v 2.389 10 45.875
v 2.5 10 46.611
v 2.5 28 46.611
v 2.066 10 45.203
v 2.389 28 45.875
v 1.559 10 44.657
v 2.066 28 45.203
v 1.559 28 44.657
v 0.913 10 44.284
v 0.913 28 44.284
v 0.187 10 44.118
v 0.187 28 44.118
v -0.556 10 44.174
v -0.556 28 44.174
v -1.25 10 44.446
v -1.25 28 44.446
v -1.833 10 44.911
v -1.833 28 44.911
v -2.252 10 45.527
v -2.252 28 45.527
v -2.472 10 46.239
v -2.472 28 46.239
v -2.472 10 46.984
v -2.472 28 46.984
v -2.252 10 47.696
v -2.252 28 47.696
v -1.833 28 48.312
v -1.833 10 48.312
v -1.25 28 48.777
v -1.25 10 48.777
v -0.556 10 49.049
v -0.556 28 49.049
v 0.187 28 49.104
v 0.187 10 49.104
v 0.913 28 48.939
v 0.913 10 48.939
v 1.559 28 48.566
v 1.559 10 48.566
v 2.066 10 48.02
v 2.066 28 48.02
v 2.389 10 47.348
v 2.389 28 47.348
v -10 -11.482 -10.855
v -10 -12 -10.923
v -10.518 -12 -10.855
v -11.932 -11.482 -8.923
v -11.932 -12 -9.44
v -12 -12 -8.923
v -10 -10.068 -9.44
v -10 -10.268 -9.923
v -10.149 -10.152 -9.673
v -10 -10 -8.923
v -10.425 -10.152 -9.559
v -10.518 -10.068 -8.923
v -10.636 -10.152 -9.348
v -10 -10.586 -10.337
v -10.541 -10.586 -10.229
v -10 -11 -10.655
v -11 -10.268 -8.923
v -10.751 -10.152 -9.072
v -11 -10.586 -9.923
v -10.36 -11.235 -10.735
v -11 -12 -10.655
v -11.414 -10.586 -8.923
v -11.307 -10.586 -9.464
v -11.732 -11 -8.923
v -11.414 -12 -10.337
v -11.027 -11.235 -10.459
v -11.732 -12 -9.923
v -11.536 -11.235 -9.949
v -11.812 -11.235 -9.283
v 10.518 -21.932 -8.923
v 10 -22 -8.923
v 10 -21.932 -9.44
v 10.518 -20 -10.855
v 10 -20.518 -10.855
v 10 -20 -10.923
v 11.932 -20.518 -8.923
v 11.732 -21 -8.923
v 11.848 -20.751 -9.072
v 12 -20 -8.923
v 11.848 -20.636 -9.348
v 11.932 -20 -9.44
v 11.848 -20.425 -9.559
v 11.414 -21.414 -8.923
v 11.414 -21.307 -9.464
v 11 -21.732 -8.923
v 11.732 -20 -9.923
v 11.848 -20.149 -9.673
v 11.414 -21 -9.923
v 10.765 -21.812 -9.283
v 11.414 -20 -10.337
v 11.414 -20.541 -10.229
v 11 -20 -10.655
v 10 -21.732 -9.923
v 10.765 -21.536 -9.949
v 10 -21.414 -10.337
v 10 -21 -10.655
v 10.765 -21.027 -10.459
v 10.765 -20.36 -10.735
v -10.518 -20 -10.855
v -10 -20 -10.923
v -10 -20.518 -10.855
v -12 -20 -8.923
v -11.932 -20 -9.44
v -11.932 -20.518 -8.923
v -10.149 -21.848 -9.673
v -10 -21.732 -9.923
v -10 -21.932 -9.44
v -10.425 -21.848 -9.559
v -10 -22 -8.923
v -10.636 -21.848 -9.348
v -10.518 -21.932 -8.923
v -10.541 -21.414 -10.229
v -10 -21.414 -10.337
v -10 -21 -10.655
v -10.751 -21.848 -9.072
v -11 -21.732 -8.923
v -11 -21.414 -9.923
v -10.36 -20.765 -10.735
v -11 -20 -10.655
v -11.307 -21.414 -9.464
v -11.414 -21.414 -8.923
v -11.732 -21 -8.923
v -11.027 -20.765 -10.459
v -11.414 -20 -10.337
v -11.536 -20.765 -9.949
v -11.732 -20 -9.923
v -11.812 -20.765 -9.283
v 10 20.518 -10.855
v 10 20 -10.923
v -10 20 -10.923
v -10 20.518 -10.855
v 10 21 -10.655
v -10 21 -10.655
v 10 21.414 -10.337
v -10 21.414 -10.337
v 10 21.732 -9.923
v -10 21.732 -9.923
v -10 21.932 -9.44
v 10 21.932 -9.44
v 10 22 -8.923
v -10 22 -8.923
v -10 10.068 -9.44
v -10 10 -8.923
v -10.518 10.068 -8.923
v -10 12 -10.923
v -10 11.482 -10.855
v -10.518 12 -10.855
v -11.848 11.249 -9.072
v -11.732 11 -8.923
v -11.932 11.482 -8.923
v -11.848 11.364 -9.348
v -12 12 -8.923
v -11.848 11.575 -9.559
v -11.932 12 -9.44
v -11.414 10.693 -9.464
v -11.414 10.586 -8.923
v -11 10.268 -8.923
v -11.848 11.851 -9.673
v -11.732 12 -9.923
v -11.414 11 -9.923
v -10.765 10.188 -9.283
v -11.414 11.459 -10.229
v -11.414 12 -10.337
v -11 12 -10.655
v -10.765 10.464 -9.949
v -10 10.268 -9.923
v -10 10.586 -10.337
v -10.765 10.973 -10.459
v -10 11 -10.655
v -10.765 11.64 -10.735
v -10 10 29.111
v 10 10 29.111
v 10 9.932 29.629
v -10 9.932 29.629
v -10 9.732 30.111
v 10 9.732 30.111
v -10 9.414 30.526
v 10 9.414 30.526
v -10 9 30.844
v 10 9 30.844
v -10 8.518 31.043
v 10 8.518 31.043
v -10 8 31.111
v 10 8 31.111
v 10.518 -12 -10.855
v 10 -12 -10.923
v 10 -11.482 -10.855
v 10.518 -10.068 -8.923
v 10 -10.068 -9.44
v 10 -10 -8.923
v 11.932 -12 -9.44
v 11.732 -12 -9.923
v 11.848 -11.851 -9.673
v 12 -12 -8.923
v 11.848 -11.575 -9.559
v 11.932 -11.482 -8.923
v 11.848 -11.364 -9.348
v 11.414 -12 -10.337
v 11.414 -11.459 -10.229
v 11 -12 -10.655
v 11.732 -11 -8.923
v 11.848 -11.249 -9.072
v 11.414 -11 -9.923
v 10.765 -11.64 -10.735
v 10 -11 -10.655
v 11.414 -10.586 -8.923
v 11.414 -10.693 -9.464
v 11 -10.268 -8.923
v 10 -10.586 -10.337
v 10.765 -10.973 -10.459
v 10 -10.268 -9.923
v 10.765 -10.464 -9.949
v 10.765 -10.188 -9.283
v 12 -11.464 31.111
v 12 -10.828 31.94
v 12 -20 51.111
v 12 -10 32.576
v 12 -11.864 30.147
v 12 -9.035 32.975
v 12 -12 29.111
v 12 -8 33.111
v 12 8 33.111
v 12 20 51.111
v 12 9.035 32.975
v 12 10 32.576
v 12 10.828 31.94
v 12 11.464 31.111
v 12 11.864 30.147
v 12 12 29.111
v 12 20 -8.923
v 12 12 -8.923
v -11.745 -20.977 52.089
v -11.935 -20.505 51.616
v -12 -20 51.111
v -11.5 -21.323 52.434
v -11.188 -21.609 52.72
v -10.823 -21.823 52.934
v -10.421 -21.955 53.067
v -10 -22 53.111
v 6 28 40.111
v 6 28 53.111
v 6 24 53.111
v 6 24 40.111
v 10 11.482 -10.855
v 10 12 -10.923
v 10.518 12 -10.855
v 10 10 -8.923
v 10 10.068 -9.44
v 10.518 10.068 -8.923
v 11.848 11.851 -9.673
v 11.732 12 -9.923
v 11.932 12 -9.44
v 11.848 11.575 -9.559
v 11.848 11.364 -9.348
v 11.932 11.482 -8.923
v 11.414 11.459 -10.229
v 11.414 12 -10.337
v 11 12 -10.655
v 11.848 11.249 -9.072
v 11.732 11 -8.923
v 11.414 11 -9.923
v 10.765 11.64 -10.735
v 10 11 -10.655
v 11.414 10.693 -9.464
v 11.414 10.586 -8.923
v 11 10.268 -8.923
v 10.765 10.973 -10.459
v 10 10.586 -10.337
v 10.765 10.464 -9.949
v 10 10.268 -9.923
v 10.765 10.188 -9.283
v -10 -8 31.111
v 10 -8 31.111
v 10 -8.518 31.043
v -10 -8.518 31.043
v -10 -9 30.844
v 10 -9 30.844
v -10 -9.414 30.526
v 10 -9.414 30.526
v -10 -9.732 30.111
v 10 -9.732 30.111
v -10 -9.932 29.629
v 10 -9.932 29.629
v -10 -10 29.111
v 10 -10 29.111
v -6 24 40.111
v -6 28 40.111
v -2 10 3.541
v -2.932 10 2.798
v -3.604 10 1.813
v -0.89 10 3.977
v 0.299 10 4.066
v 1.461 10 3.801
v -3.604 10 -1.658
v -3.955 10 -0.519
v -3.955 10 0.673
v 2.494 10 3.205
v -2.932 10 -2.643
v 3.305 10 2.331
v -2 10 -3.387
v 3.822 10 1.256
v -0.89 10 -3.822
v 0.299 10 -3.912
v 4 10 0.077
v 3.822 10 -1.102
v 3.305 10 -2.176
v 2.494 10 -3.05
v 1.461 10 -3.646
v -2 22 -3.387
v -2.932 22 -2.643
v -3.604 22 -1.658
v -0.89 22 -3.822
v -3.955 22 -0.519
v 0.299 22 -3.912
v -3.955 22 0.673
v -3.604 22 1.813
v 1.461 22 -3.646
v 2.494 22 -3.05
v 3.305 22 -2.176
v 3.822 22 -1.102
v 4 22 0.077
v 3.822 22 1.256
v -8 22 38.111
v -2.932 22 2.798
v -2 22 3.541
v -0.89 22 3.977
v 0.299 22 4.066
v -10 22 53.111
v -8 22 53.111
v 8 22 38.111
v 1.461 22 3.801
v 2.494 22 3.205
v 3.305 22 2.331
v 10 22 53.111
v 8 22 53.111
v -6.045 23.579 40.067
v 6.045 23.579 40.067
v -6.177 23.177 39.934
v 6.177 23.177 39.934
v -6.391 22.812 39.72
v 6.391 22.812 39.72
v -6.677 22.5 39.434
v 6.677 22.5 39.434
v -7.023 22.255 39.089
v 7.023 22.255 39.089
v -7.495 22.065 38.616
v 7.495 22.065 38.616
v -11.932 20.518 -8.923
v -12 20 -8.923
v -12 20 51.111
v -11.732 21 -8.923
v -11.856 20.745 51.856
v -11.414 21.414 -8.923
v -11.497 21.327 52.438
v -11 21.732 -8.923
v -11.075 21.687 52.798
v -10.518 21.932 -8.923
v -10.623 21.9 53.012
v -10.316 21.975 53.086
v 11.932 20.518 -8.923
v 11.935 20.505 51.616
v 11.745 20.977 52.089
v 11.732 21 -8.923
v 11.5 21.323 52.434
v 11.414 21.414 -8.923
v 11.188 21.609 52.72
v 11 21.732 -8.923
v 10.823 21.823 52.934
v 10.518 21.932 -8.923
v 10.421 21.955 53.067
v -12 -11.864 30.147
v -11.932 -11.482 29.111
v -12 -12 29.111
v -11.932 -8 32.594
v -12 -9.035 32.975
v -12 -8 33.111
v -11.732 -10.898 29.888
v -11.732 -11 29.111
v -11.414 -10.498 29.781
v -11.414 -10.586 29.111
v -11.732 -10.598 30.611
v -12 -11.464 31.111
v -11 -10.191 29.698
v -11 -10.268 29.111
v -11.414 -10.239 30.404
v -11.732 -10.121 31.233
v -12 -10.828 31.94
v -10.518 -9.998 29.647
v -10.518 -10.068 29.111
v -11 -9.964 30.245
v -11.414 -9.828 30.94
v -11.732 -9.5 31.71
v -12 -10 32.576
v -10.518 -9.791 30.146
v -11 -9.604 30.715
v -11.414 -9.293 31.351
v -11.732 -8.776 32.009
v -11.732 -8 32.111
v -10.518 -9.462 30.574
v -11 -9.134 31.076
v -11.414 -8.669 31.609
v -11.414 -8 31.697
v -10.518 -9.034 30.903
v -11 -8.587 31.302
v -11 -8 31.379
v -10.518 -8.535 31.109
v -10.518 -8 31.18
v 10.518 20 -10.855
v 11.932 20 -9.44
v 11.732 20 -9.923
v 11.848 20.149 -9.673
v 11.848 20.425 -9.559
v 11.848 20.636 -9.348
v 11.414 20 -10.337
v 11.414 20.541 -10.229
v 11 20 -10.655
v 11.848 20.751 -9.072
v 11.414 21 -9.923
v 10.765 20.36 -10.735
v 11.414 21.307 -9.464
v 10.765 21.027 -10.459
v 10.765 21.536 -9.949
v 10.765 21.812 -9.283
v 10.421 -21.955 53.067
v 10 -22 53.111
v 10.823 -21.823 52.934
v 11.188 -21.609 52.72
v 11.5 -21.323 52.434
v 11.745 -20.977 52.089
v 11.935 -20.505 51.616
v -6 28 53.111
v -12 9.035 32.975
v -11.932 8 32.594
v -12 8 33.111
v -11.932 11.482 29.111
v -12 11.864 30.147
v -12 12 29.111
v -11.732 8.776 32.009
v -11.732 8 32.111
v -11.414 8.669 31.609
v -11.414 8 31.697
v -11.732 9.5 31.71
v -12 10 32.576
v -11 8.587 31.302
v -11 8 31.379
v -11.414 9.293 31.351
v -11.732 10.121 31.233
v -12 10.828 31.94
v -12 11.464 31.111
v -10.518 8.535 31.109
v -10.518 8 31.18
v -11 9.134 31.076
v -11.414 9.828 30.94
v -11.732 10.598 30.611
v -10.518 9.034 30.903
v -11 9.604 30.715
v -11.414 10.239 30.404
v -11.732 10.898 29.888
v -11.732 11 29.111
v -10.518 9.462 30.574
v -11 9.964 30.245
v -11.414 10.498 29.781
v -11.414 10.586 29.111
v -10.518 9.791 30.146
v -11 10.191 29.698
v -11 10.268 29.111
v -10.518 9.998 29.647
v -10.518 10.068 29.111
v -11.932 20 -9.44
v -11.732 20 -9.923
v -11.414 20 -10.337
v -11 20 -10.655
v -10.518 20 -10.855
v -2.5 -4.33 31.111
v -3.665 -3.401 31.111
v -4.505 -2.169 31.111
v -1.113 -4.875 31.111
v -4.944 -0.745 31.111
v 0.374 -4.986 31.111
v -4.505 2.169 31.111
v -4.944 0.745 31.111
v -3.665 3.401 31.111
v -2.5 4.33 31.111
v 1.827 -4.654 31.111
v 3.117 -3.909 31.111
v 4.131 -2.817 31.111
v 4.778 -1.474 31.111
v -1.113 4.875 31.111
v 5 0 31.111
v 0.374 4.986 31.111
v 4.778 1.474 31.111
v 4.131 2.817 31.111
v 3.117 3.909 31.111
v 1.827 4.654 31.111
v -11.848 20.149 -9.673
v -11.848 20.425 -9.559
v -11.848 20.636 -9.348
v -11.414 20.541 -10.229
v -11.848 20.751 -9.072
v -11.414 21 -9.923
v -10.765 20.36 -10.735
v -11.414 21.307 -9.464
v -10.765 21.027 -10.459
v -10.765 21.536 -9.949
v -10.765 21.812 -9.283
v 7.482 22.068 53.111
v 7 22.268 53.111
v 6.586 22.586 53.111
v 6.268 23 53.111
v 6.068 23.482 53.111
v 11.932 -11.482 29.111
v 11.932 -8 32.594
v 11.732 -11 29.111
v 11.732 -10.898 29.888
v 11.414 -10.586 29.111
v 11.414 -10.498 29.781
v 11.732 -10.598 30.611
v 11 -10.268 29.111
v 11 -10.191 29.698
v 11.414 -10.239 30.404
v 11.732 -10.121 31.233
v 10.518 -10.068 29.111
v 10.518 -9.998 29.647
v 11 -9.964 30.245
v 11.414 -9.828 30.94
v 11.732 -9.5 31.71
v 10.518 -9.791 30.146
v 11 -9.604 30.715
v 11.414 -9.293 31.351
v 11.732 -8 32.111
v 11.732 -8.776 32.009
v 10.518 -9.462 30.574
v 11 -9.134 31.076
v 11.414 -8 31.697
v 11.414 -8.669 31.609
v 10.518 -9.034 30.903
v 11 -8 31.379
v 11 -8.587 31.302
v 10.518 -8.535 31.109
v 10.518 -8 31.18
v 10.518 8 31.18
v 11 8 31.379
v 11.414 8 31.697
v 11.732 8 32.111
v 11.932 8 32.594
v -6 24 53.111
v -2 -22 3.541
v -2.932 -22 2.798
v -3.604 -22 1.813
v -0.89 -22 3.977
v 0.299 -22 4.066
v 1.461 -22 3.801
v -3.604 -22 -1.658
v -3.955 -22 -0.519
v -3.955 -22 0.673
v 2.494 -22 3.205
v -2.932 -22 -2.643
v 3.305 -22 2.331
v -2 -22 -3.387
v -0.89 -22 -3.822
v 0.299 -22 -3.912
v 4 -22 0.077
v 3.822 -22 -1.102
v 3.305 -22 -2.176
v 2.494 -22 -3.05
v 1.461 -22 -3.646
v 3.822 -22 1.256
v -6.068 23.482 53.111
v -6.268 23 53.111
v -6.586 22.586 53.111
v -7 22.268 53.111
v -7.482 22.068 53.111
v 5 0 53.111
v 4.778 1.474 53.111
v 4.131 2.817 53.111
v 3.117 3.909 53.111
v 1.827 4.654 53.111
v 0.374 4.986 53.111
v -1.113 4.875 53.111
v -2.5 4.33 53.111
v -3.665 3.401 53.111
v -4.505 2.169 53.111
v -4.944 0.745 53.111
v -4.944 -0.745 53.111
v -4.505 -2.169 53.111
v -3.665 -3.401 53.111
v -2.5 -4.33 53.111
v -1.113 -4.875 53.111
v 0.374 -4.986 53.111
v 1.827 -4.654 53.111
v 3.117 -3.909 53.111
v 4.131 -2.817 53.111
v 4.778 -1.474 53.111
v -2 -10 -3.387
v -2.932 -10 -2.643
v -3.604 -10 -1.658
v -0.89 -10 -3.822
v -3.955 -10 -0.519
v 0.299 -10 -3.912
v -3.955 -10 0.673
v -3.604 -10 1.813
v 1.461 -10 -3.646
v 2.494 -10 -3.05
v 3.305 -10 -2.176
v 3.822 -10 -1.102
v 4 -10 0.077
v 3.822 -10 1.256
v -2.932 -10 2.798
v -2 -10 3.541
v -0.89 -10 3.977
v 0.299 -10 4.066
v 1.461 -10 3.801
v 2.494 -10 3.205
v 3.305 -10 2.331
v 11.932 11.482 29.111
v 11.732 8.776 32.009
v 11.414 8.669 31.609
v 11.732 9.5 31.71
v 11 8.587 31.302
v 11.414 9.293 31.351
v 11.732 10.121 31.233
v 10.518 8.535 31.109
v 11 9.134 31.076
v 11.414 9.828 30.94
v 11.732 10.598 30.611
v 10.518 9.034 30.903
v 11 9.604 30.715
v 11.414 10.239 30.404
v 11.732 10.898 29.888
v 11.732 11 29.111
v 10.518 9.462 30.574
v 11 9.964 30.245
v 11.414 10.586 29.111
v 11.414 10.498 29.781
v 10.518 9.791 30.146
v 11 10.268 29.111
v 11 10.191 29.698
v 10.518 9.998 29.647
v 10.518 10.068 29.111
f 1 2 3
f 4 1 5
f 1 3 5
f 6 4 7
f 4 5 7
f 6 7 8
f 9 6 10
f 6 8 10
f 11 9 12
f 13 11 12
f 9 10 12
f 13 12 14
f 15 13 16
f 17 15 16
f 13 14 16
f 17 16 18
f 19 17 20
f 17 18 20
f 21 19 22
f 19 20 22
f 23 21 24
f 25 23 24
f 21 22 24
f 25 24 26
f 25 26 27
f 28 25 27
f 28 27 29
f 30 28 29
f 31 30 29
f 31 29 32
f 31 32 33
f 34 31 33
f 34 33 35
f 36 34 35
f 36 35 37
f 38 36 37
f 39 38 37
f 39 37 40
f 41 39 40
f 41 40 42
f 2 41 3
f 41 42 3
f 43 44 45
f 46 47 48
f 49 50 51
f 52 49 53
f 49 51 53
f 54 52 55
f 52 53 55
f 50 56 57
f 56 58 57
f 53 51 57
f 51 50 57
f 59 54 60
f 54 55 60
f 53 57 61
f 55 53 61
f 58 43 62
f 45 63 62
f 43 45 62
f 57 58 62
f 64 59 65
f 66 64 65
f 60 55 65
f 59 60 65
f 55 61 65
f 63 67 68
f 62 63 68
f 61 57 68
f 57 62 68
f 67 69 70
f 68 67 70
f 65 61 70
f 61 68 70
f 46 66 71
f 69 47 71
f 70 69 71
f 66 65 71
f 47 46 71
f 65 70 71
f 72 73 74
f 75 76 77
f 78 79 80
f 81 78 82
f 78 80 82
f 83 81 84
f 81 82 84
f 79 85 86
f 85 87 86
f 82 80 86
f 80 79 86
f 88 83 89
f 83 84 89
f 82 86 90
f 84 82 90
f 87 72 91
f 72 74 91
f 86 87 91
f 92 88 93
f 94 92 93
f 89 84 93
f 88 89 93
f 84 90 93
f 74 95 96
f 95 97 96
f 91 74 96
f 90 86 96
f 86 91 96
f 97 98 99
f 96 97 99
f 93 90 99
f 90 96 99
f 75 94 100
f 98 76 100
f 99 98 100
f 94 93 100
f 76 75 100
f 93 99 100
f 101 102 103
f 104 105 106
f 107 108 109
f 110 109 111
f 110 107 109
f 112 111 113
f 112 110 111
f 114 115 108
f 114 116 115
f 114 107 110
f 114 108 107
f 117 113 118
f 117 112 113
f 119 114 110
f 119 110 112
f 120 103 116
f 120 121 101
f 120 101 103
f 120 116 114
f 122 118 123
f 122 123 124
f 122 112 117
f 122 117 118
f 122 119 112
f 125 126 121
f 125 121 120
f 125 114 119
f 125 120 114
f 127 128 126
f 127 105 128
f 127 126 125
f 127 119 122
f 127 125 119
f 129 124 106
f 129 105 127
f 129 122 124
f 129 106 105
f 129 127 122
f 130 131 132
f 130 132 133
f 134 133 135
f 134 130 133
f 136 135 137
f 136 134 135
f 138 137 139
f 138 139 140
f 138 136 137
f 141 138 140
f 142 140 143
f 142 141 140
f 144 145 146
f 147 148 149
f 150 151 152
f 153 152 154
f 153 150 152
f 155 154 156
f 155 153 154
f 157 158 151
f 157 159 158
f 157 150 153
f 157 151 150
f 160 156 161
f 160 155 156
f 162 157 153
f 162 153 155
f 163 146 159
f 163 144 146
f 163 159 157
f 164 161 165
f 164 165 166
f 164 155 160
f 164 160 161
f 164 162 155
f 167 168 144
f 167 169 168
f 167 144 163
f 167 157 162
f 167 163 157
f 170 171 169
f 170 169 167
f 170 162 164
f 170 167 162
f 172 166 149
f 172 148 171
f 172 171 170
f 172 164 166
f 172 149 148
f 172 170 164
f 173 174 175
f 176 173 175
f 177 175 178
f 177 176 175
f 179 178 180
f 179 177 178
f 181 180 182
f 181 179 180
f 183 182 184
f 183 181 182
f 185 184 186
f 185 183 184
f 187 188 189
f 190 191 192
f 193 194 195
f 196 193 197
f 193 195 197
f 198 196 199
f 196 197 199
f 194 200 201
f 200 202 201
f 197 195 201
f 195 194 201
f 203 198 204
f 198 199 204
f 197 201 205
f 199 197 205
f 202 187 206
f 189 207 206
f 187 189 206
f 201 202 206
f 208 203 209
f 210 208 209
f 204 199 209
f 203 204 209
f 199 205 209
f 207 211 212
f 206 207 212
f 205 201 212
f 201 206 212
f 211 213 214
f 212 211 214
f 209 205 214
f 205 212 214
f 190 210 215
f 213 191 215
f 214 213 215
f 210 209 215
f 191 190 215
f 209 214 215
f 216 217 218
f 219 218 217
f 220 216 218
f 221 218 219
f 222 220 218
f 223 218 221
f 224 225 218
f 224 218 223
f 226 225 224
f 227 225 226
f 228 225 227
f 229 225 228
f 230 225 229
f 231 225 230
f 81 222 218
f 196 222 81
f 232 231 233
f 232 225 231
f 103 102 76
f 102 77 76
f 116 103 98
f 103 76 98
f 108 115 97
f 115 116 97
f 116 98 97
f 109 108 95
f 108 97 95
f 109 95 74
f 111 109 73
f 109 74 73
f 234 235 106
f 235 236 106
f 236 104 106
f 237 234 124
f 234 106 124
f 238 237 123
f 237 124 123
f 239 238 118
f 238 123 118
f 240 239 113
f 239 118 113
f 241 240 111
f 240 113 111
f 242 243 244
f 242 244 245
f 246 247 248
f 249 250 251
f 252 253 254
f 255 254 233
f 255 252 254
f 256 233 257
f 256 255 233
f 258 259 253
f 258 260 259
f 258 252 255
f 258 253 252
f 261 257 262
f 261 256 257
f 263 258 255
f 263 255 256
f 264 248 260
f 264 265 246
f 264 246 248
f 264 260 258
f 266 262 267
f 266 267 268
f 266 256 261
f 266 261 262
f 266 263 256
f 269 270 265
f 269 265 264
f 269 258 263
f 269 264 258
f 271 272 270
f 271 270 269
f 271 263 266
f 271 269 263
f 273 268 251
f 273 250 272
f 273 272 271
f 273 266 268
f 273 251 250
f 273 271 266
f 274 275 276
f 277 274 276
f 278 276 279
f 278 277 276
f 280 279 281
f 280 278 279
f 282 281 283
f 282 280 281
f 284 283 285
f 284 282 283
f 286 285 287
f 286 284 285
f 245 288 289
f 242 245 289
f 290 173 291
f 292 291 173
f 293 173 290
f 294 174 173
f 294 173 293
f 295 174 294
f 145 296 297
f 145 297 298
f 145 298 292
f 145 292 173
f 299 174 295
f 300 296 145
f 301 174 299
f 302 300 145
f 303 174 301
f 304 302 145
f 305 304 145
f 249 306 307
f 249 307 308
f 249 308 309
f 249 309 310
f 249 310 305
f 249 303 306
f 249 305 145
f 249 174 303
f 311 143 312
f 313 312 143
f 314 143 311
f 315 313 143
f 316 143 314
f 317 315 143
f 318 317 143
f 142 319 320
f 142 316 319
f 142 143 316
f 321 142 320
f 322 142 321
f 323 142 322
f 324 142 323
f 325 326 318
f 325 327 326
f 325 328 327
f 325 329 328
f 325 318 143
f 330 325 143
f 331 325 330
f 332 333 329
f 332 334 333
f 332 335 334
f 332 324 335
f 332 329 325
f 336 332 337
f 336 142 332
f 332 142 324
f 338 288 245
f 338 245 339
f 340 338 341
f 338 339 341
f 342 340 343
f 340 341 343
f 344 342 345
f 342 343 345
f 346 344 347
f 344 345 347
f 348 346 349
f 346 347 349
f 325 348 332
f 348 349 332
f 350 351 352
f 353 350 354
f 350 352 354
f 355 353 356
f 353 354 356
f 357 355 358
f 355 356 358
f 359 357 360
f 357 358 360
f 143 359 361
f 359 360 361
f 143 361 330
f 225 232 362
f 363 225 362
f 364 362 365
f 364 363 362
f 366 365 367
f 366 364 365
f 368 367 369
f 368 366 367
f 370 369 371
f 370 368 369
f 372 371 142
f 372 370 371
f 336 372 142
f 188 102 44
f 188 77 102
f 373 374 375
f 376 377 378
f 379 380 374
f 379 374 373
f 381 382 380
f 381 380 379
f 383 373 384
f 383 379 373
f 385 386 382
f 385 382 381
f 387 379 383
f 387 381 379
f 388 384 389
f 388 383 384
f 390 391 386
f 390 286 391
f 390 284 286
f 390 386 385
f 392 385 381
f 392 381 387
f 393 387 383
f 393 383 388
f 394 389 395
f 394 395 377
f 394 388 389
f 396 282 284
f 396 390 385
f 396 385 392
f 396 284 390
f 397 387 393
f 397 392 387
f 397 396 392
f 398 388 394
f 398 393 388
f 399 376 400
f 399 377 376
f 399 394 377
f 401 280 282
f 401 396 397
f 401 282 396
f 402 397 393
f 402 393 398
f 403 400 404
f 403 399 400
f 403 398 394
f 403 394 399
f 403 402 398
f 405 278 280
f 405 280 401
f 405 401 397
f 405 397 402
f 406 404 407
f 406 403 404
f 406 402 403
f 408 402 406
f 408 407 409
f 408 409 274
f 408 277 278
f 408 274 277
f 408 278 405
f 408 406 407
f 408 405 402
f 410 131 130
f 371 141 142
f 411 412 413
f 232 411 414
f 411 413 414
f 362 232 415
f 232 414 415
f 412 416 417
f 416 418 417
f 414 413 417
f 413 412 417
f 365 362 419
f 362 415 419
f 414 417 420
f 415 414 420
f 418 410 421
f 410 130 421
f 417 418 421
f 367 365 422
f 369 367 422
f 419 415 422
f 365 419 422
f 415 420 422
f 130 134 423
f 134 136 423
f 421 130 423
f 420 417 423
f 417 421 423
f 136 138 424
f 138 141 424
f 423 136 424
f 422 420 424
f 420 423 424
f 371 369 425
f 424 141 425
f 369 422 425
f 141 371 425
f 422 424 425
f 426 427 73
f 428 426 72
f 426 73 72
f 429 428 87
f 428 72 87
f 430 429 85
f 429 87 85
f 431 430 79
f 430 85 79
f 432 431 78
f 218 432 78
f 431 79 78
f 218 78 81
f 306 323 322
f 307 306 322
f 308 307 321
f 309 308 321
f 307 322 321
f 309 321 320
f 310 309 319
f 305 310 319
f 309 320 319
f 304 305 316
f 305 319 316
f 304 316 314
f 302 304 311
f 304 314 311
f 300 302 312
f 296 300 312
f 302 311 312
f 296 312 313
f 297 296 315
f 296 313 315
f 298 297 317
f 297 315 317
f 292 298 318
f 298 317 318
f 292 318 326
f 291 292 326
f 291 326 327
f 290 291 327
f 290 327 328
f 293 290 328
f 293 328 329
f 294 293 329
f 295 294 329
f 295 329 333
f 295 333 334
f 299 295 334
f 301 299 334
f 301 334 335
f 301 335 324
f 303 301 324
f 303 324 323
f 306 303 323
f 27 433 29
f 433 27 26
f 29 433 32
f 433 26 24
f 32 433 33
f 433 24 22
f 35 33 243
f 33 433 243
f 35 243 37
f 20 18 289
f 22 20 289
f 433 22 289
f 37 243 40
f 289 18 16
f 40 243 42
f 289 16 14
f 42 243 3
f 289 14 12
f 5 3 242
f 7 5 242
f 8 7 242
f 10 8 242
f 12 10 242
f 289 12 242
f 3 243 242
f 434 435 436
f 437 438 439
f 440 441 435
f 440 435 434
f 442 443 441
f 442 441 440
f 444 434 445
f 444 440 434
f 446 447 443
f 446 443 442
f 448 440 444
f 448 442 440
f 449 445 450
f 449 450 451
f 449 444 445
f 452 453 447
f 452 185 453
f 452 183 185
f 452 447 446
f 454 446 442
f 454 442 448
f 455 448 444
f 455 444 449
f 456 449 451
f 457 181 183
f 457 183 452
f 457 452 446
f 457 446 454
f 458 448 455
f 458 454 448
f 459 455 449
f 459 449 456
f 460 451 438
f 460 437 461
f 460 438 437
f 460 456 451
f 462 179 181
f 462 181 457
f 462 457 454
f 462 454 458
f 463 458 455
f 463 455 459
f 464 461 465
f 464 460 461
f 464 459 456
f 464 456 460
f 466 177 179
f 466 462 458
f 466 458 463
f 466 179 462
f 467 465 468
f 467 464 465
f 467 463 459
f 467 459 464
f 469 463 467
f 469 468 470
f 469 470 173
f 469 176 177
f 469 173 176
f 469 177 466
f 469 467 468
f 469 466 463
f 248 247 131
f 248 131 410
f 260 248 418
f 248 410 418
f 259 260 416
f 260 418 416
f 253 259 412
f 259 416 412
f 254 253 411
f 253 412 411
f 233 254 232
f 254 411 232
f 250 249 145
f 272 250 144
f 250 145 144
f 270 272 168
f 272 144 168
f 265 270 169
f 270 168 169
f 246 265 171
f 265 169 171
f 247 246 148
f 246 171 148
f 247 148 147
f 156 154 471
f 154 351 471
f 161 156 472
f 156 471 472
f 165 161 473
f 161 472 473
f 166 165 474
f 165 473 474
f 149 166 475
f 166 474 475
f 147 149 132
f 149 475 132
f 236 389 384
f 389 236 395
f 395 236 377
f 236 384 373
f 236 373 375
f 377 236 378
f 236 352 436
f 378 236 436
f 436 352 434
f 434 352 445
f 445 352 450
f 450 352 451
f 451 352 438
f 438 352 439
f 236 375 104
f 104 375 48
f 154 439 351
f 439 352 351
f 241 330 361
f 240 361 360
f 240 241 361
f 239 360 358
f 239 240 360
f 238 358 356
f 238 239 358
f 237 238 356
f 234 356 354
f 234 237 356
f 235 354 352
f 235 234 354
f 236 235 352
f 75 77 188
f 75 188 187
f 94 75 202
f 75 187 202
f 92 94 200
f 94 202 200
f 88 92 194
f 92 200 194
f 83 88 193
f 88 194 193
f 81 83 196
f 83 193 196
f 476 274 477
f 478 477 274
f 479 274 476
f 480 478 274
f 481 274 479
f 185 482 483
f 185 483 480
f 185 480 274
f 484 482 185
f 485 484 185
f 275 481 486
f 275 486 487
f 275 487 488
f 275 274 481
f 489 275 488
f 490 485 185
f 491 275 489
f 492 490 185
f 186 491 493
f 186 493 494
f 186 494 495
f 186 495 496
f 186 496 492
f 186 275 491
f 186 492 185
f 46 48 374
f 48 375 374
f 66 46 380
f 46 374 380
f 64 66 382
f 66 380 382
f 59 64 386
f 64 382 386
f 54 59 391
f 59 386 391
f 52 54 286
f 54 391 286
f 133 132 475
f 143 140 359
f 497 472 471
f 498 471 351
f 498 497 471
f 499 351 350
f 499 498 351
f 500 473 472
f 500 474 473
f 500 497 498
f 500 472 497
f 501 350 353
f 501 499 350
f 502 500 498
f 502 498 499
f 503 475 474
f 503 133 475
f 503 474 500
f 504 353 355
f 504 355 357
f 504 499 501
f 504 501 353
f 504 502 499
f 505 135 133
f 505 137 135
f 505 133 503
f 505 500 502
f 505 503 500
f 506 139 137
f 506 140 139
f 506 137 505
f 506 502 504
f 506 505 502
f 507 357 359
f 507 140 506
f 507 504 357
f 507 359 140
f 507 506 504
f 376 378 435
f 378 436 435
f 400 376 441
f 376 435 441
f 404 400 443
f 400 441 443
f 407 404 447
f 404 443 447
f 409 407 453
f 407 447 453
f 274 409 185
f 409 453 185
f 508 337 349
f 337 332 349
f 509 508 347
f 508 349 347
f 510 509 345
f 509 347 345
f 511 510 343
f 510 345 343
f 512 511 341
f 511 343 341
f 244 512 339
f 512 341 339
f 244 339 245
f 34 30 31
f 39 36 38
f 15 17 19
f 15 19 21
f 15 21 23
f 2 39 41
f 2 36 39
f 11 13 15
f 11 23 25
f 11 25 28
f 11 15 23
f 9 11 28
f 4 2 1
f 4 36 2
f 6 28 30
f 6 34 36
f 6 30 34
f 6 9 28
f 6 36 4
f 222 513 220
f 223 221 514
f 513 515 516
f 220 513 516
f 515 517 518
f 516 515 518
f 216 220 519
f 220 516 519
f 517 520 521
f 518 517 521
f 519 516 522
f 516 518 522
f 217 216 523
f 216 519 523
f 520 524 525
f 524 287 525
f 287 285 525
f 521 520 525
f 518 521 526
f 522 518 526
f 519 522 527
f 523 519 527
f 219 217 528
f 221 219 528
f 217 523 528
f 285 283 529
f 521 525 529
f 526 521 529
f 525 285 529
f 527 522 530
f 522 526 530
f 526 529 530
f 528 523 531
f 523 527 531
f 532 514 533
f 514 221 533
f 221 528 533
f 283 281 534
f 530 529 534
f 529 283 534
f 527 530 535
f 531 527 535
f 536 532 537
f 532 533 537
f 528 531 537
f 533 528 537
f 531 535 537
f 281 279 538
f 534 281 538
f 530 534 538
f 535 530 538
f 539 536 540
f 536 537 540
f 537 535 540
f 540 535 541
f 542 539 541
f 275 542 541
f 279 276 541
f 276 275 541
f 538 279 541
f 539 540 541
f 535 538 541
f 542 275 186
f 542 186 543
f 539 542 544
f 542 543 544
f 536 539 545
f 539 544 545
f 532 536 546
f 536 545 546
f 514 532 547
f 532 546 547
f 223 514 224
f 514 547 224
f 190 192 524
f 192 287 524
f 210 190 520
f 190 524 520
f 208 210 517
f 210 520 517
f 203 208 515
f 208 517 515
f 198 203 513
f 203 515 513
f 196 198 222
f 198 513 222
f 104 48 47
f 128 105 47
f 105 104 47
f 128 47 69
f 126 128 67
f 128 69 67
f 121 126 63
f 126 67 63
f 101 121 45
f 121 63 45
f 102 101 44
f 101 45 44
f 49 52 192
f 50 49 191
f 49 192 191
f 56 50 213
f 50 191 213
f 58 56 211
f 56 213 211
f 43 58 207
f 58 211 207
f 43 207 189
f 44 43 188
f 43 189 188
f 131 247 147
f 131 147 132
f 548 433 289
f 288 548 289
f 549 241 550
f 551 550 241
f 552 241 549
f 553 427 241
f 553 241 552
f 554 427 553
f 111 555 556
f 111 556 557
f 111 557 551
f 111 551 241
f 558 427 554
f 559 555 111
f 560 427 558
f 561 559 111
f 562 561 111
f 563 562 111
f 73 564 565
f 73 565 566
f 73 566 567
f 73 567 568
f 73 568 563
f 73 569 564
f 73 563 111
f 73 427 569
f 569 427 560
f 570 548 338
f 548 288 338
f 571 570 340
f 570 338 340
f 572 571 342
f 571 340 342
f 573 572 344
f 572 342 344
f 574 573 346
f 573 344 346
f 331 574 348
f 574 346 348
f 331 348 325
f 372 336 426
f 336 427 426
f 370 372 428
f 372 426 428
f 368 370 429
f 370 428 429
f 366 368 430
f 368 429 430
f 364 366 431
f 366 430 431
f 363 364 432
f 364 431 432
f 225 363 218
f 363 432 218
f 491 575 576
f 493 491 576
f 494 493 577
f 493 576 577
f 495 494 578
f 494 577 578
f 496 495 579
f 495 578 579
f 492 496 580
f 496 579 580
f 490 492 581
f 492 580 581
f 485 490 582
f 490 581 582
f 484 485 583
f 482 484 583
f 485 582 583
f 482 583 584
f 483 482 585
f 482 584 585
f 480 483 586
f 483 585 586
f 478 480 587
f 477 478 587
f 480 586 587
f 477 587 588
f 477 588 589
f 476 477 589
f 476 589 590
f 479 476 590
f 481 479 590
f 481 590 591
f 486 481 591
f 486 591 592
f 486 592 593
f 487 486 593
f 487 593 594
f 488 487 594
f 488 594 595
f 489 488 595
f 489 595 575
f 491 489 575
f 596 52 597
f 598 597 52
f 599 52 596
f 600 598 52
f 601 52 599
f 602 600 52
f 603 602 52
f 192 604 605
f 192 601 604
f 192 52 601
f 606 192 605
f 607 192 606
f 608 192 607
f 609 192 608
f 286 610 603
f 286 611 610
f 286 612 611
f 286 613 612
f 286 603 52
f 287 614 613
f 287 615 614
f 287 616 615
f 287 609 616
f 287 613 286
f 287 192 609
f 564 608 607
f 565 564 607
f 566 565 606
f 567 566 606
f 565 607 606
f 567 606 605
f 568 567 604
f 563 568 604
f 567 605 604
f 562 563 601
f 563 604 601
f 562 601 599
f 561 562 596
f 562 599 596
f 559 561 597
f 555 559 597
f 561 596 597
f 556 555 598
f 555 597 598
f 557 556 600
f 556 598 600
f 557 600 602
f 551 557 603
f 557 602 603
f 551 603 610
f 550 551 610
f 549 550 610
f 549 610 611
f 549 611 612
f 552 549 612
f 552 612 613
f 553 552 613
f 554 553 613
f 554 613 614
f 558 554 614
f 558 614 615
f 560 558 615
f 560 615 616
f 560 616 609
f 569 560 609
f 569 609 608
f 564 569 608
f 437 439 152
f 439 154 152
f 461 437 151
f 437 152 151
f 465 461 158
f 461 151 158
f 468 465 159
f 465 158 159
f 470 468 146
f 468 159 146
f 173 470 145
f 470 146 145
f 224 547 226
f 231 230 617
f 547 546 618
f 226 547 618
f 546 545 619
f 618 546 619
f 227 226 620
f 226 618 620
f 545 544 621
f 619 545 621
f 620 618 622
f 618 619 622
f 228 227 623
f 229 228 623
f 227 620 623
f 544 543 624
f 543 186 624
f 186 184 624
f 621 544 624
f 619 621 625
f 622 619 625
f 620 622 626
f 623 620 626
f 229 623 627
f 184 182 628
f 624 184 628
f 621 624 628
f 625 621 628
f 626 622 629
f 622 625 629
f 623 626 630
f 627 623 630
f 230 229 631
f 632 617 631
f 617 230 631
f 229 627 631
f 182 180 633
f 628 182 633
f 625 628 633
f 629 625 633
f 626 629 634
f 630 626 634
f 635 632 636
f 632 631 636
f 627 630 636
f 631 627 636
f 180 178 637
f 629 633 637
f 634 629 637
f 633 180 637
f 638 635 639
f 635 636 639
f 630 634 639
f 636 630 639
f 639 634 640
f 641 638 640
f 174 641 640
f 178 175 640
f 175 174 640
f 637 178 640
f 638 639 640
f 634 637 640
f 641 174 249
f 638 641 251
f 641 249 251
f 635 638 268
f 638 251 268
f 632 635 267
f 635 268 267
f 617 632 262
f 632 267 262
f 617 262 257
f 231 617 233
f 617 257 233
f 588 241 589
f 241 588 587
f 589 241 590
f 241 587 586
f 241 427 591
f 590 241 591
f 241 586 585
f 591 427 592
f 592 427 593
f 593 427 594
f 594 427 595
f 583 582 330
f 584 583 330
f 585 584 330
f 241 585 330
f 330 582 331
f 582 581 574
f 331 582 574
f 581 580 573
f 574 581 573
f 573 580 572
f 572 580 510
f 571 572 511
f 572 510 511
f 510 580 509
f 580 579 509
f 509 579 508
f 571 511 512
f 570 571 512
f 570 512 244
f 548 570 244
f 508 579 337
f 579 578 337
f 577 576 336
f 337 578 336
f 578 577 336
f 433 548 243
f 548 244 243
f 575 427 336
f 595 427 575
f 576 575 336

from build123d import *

# Parameters (mm, degrees)
BOSS_EXTRUDE2_DEPTH      = 12
BOSS_EXTRUDE2_DEPTH_BACK = 12
SKETCH1_4_W              = 13
SKETCH1_4_H              = 6
BOSS_EXTRUDE3_DEPTH      = 6
BOSS_EXTRUDE3_DEPTH_BACK = 6
FILLET1_R                = 2
SKETCH2_R                = 2.5
CUT_EXTRUDE1_DEPTH       = 18
SKETCH4_R                = 4
CUT_EXTRUDE2_DEPTH       = 7
CUT_EXTRUDE2_DEPTH_BACK  = 45
SKETCH5_R                = 5
CUT_EXTRUDE3_DEPTH       = 35


with BuildPart() as part:
    # Sketch1 → Boss-Extrude2 (new body, two sides)
    with BuildSketch(Plane(origin=(0, 0, 0), x_dir=(0, 0, -1), z_dir=(1, 0, 0))) as boss_extrude2_sk:
        Polygon((10.922768667, 10), (10.922768667, 22), (-40.111460143, 22), (-53.111460143, 22), (-53.111460143, -22), (10.922768667, -22), (10.922768667, -10), (-31.111460143, -10), (-31.111460143, 10), align=None)
    extrude(amount=BOSS_EXTRUDE2_DEPTH)
    extrude(boss_extrude2_sk.sketch, amount=-BOSS_EXTRUDE2_DEPTH_BACK)

    # Sketch1<4> → Boss-Extrude3 (add, two sides)
    with BuildSketch(Plane(origin=(0, 0, 0), x_dir=(0, 0, -1), z_dir=(1, 0, 0))) as boss_extrude3_sk:
        with Locations((-46.611460143, 25)):
            Rectangle(SKETCH1_4_W, SKETCH1_4_H)
    extrude(amount=BOSS_EXTRUDE3_DEPTH)
    extrude(boss_extrude3_sk.sketch, amount=-BOSS_EXTRUDE3_DEPTH_BACK)

    # Fillet1
    fillet1_edges = [part.edges().sort_by_distance(p)[0] for p in [
        (-12, -16, -10.922768667),
        (0, 22, -10.922768667),
        (0, 10, -10.922768667),
        (0, 10, 31.111460143),
        (0, -10, 31.111460143),
        (0, -10, -10.922768667),
        (0, -22, -10.922768667),
        (-12, -10, 10.094345738),
        (-12, 0, 31.111460143),
        (12, 0, 53.111460143),
        (12, -22, 21.094345738),
        (12, -16, -10.922768667),
        (12, -10, 10.094345738),
        (12, 0, 31.111460143),
        (12, 16, -10.922768667),
        (-12, 10, 10.094345738),
        (12, 10, 10.094345738),
        (12, 22, 21.094345738),
        (-12, 16, -10.922768667),
        (-12, 22, 21.094345738),
        (0, 22, 40.111460143),
        (6, 22, 46.611460143),
        (-6, 22, 46.611460143),
        (-12, 0, 53.111460143),
        (-12, -22, 21.094345738),
    ]]
    fillet(fillet1_edges, radius=FILLET1_R)

    # Sketch2 → Cut-Extrude1 (cut)
    with BuildSketch(Plane(origin=(0, 28, 0), x_dir=(1, 0, 0), z_dir=(0, 1, 0))):
        with Locations((0, -46.611460143)):
            Circle(SKETCH2_R)
    extrude(amount=-CUT_EXTRUDE1_DEPTH, mode=Mode.SUBTRACT)

    # Sketch4 → Cut-Extrude2 (cut, two sides)
    with BuildSketch(Plane(origin=(0, 22, 0), x_dir=(1, 0, 0), z_dir=(0, 1, 0))) as cut_extrude2_sk:
        with Locations((0, -0.077231333)):
            Circle(SKETCH4_R)
    extrude(amount=CUT_EXTRUDE2_DEPTH, mode=Mode.SUBTRACT)
    extrude(cut_extrude2_sk.sketch, amount=-CUT_EXTRUDE2_DEPTH_BACK, mode=Mode.SUBTRACT)

    # Sketch5 → Cut-Extrude3 (cut)
    with BuildSketch(Plane.XY.offset(53.111460143)):
        Circle(SKETCH5_R)
    extrude(amount=-CUT_EXTRUDE3_DEPTH, mode=Mode.SUBTRACT)


solid = part.part
